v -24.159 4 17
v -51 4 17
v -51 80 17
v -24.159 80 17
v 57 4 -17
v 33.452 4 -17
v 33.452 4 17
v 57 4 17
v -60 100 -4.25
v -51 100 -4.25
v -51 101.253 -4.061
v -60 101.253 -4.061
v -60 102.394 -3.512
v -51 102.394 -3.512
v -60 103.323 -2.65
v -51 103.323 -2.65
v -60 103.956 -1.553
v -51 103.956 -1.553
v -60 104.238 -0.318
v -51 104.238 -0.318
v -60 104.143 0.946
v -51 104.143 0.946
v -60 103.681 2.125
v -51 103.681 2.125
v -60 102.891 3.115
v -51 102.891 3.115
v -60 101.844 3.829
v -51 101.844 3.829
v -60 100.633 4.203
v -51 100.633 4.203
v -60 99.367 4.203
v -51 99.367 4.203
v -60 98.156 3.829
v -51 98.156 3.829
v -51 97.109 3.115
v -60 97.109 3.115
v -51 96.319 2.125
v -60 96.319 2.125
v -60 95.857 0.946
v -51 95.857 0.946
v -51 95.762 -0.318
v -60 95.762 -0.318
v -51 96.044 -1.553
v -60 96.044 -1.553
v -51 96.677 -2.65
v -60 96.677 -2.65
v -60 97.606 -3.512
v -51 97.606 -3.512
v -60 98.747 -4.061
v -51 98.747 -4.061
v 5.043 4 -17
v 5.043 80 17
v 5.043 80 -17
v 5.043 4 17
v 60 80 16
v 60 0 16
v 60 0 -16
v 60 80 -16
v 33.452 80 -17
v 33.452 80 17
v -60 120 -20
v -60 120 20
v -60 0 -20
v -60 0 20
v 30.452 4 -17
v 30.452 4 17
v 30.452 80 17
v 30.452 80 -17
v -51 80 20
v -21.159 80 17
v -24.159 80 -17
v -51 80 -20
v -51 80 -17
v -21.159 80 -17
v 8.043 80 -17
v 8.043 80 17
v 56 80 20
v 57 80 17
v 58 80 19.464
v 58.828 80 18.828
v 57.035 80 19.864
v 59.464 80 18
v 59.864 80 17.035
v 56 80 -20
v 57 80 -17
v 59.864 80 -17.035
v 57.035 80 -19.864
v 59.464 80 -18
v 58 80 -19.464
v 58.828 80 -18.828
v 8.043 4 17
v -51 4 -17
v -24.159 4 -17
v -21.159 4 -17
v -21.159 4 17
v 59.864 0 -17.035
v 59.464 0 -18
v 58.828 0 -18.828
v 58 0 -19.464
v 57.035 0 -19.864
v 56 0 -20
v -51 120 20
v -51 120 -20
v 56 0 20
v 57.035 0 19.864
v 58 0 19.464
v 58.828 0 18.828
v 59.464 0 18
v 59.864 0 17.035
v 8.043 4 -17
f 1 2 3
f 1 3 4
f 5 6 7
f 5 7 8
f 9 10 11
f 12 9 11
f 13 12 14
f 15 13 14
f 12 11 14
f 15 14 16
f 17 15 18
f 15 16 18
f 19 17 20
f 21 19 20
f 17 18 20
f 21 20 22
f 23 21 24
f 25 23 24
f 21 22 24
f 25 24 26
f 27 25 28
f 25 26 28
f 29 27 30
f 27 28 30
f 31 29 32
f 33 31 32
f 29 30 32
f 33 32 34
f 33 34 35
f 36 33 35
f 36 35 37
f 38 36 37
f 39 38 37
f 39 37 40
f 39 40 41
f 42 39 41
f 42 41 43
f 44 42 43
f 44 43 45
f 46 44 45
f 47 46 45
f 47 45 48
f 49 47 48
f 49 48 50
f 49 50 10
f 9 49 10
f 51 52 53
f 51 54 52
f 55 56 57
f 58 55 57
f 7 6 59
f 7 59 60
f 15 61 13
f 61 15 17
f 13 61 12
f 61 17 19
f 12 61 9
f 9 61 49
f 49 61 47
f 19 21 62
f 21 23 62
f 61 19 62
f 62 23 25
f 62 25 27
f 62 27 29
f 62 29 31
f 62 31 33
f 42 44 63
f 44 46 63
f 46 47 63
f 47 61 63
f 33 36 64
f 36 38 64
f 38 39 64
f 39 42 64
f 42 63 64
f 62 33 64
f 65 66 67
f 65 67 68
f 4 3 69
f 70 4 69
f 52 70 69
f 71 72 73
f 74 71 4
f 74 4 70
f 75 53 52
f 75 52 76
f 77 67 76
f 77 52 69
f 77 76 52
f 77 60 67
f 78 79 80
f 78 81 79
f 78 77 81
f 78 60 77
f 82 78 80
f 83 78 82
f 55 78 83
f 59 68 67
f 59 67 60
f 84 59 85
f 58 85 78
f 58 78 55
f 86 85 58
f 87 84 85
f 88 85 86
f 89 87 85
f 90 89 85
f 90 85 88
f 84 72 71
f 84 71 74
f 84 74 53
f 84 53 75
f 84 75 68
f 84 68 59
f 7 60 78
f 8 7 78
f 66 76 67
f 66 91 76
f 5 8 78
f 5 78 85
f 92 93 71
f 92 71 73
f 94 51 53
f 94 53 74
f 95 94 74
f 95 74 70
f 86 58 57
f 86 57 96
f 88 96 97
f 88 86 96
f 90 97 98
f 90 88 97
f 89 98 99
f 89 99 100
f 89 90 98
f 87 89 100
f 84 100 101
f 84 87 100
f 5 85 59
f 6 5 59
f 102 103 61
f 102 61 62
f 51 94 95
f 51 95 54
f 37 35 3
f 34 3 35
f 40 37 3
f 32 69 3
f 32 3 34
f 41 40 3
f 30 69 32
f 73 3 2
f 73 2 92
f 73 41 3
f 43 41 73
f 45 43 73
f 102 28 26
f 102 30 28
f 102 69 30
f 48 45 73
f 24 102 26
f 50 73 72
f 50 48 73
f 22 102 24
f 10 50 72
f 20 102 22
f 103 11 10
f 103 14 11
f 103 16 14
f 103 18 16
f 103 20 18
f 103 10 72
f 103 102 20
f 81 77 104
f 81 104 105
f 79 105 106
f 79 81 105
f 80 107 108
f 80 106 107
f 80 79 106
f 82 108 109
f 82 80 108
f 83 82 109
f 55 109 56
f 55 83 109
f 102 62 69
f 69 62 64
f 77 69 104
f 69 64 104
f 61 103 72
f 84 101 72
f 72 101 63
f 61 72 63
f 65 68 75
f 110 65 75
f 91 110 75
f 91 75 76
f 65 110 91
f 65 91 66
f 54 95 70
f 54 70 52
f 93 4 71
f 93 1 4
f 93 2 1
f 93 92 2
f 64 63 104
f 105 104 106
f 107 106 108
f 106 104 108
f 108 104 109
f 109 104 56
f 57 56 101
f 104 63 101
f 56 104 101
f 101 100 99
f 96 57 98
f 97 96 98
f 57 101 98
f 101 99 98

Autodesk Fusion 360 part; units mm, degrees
sketch "Sketch1" plane through (0, 0, 0) normal (0, 1, 0) x (1, 0, 0)
  line L0 (60, 20) -> (-60, 20)
  line L1 (-60, 20) -> (-60, -20)
  line L2 (-60, -20) -> (60, -20)
  line L3 (60, -20) -> (60, 20)
  line L4 (60, 20) -> (-60, -20) construction
  line L5 (-60, 20) -> (60, -20) construction
  line L6 (57, 17) -> (-57, 17)
  line L7 (-57, 17) -> (-57, -17)
  line L8 (-57, -17) -> (57, -17)
  line L9 (57, -17) -> (57, 17)
  line L10 (57, 17) -> (-57, -17) construction
  line L11 (-57, 17) -> (57, -17) construction
  line L12 (-24.159, 17) -> (-21.159, 17)
  line L13 (-21.159, 17) -> (-21.159, -17)
  line L14 (-21.159, -17) -> (-24.159, -17)
  line L15 (-24.159, -17) -> (-24.159, 17)
  line L16 (8.0431, 17) -> (8.0431, -17)
  line L17 (5.0431, -17) -> (5.0431, 17)
  line L18 (8.0431, -17) -> (5.0431, -17)
  line L19 (5.0431, 17) -> (8.0431, 17)
  line L20 (30.4518, 17) -> (33.4518, 17)
  line L21 (33.4518, 17) -> (33.4518, -17)
  line L22 (30.4518, -17) -> (30.4518, 17)
  line L23 (33.4518, -17) -> (30.4518, -17)
  dimension "d1" = 120
  dimension "d2" = 40
  dimension "d3" = 114
  dimension "d4" = 34
  dimension "d20" = 3
  dimension "d21" = 34
  dimension "d26" = 3
  dimension "d27" = 34
  dimension "d28" = 3
  dimension "d29" = 34
extrude "Extrude1" add sketch "Sketch1" along normal blind 80 contours L0 L1 L2 L3 | L6 L8 L20 L21 L22 L23 | L6 L8 L16 L17 L18 L19 | L6 L8 L12 L13 L14 L15 makes body 1
extrude "Extrude2" add sketch "Sketch1" along normal blind 4 contours L6 L8 L9 L21 | L6 L8 L20 L21 L22 L23 | L6 L8 L16 L22 | L6 L8 L16 L17 L18 L19 | L6 L8 L13 L17 | L6 L8 L12 L13 L14 L15 | L6 L7 L8 L15 bodies 1
sketch "Sketch2" plane through (0, 0, 0) normal (1, 0, 0) x (0, 0, -1)
  line L0 (-20, 0) -> (20, 0)
  line L1 (20, 0) -> (20, 80)
  line L2 (20, 80) -> (-20, 80)
  line L3 (-20, 80) -> (-20, 0)
  line L4 (20, 120) -> (-20, 120)
  line L5 (-20, 120) -> (-20, 80)
  line L6 (-20, 80) -> (20, 80)
  line L7 (20, 80) -> (20, 120)
  line L8 (20, 120) -> (-20, 80) construction
  line L9 (-20, 120) -> (20, 80) construction
  line L10 (20, 0) -> (-20, 0)
  line L11 (-20, 0) -> (-20, -40)
  line L12 (-20, -40) -> (20, -40)
  line L13 (20, -40) -> (20, 0)
  line L14 (20, 0) -> (-20, -40) construction
  line L15 (-20, 0) -> (20, -40) construction
  circle A0 centre (0, 100) radius 4.25
  circle A1 centre (0, -20) radius 4.25
  point P0 (0, 100)
  point P1 (0, -20)
  dimension "d9" = 40
  dimension "d10" = 40
  dimension "d11" = 40
  dimension "d12" = 40
  dimension "d13" = 8.5
  dimension "d14" = 8.5
extrude "Extrude3" add sketch "Sketch2" along normal blind -60 and the other way blind 51 contours L0 L1 L2 L3 L6 L10 | L2 L4 L5 L6 L7 bodies 1
fillet "Fillet1" radius 4 2 edges at (60, 40, -20) (60, 40, 20) on bodies 1
copy_body "Body->Comp1" bodies 1 removing the originals makes body 2 in component "item40ToolHoplder-01"
component "item40ToolHoplder-01" placed x (1, 0, 0) y (0, 1, 0) z (0, 0, 1) at (0, 0, 0)
